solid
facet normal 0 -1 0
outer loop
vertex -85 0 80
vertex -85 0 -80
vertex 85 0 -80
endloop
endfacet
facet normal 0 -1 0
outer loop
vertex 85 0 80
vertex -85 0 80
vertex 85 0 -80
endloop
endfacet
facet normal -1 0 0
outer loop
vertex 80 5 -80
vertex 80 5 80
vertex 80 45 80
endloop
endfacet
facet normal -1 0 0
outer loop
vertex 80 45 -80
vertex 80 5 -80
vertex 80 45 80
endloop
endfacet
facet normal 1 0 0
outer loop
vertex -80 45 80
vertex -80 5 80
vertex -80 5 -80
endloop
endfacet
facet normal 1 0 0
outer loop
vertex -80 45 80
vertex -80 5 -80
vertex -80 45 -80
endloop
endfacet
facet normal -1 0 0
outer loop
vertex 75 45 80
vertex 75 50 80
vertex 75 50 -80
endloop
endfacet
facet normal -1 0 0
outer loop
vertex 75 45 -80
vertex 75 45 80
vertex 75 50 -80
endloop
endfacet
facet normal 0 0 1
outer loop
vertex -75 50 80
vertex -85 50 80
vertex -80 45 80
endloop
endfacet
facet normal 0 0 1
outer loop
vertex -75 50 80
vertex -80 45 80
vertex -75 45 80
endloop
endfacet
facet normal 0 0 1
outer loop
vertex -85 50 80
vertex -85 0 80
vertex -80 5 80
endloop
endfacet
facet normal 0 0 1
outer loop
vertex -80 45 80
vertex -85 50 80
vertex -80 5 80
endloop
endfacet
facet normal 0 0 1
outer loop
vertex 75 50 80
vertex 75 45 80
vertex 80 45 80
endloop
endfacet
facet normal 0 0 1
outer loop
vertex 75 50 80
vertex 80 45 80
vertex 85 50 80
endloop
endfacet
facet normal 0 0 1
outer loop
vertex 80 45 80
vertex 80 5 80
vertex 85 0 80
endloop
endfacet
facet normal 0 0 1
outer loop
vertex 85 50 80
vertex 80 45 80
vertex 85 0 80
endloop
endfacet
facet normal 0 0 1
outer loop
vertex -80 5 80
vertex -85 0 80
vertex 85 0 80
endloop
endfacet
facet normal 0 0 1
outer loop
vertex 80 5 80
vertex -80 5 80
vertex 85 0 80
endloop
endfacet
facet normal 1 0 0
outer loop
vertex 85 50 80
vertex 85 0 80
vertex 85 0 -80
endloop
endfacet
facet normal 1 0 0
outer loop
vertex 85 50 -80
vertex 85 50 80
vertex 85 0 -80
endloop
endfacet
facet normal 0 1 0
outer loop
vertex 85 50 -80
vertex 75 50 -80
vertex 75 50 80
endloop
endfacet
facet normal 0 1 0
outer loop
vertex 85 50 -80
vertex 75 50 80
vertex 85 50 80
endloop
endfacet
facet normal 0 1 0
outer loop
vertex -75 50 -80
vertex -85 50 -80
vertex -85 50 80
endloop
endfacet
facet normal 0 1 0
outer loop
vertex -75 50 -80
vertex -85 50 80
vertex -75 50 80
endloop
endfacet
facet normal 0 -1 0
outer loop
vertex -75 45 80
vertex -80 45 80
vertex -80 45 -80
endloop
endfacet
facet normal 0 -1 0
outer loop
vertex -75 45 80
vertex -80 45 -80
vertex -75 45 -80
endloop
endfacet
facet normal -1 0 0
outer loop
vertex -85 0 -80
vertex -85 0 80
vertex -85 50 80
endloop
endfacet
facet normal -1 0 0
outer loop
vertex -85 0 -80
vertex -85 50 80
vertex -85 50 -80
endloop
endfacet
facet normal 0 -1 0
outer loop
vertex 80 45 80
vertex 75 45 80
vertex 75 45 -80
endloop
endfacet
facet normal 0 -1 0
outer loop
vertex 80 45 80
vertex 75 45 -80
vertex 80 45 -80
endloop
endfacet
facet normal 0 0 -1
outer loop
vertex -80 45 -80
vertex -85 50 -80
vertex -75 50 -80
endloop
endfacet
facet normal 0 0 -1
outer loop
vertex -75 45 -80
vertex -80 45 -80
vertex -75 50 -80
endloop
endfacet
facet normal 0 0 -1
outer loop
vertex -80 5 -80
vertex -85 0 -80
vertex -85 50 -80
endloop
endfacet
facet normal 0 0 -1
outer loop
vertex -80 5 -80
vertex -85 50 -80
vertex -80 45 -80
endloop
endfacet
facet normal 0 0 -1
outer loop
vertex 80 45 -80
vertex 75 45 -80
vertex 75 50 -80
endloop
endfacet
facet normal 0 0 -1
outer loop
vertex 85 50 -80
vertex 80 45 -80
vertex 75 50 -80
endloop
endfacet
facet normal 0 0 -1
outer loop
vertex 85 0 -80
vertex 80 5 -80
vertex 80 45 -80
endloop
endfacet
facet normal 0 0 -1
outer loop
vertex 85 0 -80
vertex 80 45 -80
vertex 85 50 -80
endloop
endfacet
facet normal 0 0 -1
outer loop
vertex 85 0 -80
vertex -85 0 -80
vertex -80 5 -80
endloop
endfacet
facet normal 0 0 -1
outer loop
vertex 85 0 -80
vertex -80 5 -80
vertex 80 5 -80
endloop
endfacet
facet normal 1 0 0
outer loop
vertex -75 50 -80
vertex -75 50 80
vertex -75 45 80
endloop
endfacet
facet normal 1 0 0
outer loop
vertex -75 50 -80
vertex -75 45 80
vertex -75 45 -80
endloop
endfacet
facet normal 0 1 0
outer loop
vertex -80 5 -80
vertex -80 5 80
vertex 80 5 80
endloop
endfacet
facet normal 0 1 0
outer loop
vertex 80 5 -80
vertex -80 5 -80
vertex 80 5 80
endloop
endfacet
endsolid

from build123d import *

# Parameters (mm, degrees)
SKETCH1_W           = 170
SKETCH1_H           = 160
BOSS_EXTRUDE2_DEPTH = 50
CUT_EXTRUDE2_REACH  = 189.949
SKETCH3_W           = 160
SKETCH3_H           = 40
CUT_EXTRUDE3_REACH  = 128.984
SKETCH4_W           = 150
SKETCH4_H           = 160


with BuildPart() as part:
    # Sketch1 → Boss-Extrude2 (new body)
    with BuildSketch(Plane(origin=(0, 0, 0), x_dir=(1, 0, 0), z_dir=(0, 1, 0))):
        Rectangle(SKETCH1_W, SKETCH1_H)
    extrude(amount=BOSS_EXTRUDE2_DEPTH)

    # Sketch3 → Cut-Extrude2 (cut, up to next)
    with BuildSketch(Plane.XY.offset(80), mode=Mode.PRIVATE) as cut_extrude2_sk1:
        with Locations((0, 25)):
            Rectangle(SKETCH3_W, SKETCH3_H)
    cut_extrude2_tool1 = extrude(cut_extrude2_sk1.sketch, amount=-CUT_EXTRUDE2_REACH, mode=Mode.PRIVATE) & part.part
    add(cut_extrude2_tool1.solids().sort_by_distance((0, 25, 80))[0], mode=Mode.SUBTRACT)

    # Sketch4 → Cut-Extrude3 (cut, up to next)
    with BuildSketch(Plane(origin=(0, 50, 0), x_dir=(1, 0, 0), z_dir=(0, 1, 0)), mode=Mode.PRIVATE) as cut_extrude3_sk1:
        Rectangle(SKETCH4_W, SKETCH4_H)
    cut_extrude3_tool1 = extrude(cut_extrude3_sk1.sketch, amount=-CUT_EXTRUDE3_REACH, mode=Mode.PRIVATE) & part.part
    add(cut_extrude3_tool1.solids().sort_by_distance((0, 50, 0))[0], mode=Mode.SUBTRACT)


solid = part.part
